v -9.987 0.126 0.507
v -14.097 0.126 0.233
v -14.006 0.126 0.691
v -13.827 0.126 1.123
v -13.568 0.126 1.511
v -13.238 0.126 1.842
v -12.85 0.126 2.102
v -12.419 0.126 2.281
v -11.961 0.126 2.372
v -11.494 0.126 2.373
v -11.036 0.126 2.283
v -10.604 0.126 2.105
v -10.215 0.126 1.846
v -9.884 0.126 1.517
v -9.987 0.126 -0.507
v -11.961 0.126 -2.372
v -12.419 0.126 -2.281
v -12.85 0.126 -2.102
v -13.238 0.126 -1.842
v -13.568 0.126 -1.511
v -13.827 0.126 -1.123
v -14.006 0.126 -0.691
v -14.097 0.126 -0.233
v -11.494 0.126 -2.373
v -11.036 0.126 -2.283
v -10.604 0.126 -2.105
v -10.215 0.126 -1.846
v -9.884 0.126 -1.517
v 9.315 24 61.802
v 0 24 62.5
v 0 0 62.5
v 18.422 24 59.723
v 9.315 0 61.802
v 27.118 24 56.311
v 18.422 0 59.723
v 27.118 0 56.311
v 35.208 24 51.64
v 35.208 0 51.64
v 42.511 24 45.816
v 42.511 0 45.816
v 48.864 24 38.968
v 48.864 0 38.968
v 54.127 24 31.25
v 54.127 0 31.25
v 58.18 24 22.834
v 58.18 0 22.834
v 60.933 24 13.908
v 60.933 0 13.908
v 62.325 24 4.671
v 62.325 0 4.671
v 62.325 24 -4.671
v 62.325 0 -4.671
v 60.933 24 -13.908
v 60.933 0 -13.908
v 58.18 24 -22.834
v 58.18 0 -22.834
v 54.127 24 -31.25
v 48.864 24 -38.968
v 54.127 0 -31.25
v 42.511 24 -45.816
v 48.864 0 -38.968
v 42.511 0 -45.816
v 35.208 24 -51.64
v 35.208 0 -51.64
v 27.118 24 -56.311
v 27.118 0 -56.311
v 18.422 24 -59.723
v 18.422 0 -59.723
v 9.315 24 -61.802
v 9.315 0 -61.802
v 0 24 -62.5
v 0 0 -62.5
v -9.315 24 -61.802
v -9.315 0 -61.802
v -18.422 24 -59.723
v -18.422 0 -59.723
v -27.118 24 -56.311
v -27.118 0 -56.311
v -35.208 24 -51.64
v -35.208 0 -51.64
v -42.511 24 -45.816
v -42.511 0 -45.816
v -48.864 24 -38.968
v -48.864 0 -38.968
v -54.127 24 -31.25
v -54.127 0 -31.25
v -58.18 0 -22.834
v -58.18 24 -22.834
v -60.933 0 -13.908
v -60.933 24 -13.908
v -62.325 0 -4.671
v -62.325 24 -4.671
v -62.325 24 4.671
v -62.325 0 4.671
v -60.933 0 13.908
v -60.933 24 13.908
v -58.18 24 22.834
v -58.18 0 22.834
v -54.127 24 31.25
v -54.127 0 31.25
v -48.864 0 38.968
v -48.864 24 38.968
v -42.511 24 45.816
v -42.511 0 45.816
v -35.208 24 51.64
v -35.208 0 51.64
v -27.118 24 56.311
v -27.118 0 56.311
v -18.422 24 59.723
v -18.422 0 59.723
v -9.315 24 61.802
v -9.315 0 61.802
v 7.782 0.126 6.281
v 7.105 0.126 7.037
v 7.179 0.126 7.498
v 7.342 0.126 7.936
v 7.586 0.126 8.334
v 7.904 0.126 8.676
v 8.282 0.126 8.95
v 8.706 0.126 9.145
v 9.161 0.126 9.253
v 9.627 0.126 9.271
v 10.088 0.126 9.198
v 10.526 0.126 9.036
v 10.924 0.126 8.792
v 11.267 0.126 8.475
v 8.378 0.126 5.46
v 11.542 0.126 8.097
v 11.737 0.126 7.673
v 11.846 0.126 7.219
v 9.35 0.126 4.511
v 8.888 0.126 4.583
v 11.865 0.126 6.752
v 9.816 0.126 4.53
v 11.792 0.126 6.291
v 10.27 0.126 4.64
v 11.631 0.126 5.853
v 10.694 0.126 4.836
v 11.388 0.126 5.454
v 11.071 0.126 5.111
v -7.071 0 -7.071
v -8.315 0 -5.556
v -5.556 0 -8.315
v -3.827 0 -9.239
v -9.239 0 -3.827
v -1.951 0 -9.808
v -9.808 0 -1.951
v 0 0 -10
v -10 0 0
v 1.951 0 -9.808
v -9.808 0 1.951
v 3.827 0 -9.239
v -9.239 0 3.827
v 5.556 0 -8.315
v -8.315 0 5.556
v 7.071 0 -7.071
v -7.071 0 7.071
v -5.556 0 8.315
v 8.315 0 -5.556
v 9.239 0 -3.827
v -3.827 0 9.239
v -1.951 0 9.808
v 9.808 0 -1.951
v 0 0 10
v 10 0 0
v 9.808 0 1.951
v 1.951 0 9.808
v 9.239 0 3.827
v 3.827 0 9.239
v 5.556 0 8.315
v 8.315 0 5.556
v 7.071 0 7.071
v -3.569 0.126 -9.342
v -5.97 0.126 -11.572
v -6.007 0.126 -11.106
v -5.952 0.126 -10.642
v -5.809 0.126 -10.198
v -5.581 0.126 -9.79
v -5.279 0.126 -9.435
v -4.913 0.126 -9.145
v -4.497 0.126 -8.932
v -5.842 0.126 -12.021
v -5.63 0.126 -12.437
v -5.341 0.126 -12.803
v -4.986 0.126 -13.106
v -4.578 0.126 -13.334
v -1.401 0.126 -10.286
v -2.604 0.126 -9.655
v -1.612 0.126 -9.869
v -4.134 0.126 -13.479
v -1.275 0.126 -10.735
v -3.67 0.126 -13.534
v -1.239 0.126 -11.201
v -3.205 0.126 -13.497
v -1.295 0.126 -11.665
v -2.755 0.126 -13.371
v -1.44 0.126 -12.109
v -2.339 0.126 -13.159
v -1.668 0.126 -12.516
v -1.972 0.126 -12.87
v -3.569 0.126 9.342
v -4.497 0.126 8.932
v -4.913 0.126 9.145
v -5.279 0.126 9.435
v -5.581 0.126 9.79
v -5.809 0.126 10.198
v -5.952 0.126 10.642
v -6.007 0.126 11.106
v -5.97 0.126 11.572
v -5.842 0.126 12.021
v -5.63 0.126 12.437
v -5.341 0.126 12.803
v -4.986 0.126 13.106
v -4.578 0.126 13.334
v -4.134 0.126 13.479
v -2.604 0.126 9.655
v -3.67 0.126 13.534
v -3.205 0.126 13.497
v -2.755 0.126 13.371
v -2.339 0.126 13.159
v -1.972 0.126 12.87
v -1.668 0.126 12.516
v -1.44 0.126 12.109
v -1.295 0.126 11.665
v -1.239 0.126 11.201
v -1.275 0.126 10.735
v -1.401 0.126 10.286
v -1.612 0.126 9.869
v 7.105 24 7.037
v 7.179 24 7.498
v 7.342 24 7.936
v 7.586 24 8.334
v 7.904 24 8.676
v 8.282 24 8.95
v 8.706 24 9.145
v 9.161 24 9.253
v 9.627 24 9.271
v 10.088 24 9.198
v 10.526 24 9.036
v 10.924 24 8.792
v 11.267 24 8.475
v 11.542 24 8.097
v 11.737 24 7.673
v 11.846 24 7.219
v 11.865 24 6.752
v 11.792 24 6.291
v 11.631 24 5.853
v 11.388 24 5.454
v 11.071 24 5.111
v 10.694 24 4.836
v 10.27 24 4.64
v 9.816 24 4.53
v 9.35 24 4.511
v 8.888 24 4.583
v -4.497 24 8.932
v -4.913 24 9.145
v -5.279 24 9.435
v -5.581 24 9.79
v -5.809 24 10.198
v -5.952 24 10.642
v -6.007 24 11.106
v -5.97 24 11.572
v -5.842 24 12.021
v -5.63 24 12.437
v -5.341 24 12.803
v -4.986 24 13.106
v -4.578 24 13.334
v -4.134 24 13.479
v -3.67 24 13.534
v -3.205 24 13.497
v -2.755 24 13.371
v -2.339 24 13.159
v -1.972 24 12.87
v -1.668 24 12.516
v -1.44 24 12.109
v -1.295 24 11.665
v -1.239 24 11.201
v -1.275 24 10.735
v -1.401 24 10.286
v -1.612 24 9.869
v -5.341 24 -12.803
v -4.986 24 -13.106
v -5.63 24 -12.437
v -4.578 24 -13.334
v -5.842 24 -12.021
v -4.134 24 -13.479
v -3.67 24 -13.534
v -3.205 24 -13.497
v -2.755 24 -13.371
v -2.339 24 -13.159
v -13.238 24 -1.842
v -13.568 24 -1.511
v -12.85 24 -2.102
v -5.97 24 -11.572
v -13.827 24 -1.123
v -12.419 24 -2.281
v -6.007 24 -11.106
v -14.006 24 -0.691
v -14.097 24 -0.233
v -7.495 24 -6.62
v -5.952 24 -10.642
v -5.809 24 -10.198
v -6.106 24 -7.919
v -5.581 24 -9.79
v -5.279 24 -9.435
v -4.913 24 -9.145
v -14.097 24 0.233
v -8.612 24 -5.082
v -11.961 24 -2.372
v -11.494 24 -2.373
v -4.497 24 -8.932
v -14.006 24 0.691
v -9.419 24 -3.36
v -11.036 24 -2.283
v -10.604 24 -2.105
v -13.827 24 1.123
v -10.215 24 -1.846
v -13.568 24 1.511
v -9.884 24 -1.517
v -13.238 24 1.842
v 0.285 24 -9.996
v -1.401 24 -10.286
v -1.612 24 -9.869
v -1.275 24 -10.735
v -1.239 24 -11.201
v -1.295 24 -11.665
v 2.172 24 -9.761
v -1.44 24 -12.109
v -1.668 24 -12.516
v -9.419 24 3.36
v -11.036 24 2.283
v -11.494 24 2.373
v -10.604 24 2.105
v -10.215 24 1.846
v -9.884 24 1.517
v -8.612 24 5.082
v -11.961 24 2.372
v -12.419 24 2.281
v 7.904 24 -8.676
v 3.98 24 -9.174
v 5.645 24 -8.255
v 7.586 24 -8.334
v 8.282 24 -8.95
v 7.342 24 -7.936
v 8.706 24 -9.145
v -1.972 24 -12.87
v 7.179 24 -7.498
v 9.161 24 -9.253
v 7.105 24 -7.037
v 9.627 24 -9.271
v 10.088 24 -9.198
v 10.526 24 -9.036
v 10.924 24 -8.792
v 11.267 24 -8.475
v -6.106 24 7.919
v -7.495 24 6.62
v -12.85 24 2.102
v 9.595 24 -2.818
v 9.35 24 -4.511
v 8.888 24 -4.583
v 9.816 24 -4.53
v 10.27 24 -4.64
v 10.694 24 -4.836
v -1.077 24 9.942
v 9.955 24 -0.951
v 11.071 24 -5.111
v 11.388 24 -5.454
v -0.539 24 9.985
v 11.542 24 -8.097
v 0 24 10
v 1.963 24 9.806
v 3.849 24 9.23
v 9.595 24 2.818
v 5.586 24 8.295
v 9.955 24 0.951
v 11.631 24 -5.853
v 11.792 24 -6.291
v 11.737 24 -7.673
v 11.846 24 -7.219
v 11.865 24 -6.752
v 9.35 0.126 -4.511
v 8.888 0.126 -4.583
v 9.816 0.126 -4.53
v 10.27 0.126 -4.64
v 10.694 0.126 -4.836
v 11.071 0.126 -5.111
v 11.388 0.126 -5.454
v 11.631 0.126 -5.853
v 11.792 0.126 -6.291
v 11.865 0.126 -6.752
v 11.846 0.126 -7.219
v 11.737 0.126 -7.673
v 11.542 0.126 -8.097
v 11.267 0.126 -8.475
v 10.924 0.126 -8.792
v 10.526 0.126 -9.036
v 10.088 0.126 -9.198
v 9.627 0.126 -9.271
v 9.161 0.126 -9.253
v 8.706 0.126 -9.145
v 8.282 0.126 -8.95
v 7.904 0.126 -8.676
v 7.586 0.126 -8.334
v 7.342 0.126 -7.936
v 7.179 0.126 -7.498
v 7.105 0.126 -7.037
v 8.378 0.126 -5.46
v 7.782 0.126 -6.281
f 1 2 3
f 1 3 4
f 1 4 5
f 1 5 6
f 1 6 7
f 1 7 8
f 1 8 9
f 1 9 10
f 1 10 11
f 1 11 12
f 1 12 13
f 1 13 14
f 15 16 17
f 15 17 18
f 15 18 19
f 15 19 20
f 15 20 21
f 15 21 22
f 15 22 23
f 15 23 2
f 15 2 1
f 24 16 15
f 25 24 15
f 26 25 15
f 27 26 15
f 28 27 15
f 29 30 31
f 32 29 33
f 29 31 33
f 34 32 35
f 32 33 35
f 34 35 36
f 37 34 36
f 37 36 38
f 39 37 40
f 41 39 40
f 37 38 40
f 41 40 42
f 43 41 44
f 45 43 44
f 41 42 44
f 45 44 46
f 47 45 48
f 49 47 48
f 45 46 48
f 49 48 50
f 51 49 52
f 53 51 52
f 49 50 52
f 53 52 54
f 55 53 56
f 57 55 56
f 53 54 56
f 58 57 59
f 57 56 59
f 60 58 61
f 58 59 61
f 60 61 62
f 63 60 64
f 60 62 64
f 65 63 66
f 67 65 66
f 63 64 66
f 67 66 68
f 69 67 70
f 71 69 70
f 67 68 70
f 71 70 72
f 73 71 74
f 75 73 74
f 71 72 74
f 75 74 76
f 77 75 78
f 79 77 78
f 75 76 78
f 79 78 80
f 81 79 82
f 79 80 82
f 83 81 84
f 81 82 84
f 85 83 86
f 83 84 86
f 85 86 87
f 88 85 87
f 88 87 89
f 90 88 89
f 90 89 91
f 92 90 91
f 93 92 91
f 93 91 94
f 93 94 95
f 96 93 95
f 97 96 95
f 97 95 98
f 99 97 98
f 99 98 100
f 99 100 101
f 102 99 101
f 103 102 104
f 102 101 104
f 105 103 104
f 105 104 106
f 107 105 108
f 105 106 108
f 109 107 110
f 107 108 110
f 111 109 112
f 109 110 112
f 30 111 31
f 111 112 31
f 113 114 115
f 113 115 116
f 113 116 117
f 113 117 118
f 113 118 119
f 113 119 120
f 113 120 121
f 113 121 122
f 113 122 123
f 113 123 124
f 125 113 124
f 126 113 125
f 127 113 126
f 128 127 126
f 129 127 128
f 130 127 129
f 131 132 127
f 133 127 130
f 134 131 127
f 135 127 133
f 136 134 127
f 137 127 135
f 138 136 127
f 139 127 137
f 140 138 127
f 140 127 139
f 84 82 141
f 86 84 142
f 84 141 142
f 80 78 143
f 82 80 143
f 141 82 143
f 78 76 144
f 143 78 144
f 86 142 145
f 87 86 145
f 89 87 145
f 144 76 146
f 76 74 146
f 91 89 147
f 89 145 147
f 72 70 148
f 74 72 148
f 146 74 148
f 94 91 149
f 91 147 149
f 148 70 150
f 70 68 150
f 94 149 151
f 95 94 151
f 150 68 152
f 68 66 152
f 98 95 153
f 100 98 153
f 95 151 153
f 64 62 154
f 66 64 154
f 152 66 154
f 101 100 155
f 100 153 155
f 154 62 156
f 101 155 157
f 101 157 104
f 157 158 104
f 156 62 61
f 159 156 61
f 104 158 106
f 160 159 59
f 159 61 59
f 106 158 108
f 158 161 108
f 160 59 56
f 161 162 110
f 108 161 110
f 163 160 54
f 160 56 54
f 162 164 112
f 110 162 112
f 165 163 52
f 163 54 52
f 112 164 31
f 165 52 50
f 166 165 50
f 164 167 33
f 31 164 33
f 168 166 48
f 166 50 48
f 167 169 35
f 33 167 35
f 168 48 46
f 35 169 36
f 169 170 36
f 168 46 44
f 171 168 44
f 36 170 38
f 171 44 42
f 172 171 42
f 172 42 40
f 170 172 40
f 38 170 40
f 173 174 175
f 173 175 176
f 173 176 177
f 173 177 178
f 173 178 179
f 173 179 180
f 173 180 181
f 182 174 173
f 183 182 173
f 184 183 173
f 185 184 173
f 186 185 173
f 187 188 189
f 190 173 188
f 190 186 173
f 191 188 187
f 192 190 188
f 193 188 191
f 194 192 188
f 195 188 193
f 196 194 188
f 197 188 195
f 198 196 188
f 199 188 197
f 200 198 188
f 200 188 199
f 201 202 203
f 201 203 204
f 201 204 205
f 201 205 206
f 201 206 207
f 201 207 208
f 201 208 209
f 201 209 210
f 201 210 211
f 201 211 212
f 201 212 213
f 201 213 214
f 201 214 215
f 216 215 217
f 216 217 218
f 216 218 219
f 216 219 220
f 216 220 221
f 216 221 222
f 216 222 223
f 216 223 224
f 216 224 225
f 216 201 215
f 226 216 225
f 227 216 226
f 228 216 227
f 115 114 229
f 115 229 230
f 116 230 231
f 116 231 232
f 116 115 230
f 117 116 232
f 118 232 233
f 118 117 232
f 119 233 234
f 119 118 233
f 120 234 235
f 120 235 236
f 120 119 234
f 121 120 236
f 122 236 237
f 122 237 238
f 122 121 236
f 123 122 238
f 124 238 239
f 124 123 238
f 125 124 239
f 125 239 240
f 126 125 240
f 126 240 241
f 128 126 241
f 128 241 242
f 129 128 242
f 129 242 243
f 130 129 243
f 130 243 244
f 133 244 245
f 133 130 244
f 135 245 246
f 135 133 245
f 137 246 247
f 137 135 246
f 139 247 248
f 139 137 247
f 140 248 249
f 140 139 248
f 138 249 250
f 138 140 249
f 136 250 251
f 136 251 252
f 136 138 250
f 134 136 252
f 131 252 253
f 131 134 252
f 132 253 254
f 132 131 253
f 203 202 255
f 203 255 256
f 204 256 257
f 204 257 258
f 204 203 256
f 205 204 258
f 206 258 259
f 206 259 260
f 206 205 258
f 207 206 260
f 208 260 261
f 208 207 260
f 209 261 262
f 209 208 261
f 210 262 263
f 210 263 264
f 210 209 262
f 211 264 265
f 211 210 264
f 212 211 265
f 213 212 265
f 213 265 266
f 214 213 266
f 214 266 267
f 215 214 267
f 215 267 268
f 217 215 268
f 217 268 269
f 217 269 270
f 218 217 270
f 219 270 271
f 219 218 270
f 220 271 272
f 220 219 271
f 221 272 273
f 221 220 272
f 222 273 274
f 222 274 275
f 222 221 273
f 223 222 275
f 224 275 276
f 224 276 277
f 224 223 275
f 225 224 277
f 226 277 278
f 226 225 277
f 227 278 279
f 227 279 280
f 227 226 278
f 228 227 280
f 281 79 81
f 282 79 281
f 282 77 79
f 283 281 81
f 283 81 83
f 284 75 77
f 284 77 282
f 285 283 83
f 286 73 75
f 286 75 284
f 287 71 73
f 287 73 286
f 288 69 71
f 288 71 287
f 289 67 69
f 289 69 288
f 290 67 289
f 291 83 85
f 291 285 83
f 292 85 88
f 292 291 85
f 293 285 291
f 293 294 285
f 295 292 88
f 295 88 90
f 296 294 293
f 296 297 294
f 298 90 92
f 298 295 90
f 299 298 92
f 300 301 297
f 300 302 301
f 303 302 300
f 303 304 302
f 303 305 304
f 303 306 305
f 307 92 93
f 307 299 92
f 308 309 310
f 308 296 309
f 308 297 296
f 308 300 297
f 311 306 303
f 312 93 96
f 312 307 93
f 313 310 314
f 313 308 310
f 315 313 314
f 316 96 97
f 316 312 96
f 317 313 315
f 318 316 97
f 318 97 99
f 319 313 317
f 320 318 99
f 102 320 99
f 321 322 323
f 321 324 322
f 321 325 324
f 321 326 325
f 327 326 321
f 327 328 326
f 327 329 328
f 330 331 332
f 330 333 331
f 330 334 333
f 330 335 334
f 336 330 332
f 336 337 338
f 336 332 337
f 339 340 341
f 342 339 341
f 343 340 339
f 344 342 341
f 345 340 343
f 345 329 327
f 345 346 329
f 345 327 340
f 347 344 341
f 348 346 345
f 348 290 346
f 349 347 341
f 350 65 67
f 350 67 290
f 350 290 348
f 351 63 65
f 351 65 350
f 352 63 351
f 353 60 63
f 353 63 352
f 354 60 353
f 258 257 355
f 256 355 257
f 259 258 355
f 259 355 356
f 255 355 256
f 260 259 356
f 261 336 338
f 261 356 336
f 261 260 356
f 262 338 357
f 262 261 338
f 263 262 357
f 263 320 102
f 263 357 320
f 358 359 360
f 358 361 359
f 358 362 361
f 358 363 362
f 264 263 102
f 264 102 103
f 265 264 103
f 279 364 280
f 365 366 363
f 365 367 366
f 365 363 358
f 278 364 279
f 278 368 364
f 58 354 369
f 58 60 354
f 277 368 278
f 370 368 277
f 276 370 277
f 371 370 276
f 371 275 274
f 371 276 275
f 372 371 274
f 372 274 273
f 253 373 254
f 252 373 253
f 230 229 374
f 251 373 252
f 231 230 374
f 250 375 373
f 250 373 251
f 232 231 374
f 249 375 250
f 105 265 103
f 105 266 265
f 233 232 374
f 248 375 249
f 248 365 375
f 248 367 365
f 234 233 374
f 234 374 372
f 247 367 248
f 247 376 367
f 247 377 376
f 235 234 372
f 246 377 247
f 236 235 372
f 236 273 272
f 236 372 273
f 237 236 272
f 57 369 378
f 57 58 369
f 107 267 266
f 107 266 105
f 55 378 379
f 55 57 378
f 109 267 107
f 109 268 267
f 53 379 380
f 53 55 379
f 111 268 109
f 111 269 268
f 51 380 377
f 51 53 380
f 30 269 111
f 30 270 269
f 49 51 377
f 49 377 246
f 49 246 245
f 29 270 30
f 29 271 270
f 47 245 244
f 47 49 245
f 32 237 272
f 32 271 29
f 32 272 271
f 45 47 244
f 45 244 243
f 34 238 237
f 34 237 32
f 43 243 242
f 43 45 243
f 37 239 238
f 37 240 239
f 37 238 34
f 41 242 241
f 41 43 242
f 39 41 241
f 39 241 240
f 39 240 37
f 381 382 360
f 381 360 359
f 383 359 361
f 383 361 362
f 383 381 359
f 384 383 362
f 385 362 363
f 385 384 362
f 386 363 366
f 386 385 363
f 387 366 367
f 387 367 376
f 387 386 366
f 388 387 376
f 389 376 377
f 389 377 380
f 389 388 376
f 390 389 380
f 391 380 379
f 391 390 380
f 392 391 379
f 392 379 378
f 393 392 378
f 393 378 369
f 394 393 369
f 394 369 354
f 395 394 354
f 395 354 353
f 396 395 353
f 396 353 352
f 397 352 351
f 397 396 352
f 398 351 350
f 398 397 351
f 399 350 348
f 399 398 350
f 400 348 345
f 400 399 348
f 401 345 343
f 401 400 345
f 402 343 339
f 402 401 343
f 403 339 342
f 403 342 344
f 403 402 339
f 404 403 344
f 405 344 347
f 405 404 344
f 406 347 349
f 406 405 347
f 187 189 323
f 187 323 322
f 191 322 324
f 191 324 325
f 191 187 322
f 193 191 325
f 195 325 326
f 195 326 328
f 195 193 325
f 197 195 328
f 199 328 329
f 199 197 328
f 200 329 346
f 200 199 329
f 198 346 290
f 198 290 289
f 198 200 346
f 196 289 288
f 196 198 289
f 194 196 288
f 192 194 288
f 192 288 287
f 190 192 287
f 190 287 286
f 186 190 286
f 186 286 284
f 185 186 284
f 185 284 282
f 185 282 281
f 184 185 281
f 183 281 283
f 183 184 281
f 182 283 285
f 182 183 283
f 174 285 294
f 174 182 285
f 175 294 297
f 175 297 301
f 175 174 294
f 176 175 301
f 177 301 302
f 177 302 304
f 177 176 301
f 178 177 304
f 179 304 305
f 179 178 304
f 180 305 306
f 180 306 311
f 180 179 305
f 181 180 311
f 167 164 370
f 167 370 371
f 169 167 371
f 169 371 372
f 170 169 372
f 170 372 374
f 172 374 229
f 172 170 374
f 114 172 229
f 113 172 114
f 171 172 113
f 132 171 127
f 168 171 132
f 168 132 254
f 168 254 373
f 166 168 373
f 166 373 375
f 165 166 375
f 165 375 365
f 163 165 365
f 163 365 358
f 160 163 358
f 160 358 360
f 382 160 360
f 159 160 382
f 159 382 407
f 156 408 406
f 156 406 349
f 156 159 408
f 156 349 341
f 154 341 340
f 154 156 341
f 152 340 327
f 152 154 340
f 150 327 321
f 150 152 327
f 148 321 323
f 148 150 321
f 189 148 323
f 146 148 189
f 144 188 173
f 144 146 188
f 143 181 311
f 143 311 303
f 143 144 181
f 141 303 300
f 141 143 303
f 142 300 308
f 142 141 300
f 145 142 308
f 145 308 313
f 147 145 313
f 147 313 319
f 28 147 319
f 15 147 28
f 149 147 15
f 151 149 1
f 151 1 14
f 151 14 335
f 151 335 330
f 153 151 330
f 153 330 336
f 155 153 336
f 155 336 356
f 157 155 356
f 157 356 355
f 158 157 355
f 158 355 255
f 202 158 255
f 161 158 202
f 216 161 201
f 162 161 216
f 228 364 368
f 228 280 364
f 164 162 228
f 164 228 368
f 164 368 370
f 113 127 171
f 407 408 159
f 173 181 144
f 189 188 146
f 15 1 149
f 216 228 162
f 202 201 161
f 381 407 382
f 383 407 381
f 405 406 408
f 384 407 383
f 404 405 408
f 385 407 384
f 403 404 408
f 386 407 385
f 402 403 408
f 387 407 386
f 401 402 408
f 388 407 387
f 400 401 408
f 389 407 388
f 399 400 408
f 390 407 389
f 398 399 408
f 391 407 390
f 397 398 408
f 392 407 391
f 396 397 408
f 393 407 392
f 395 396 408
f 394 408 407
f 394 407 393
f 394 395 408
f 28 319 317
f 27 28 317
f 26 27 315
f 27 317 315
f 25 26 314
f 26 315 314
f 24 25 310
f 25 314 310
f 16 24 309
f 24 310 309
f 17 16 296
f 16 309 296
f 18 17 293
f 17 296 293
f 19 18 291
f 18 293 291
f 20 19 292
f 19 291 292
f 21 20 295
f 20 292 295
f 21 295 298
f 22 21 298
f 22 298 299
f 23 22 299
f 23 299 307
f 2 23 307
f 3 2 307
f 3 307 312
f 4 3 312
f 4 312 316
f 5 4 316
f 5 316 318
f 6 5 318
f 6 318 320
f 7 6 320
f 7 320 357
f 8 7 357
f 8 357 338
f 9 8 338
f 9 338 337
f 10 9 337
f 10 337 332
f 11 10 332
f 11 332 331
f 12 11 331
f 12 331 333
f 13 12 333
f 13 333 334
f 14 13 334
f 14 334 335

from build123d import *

# Parameters (mm, degrees)
SKETCH1_R           = 62.5
BOSS_EXTRUDE1_DEPTH = 24
SKETCH2_R           = 10
CUT_EXTRUDE1_DEPTH  = 92.588754768
SKETCH3_R           = 2.384291232
CUT_EXTRUDE2_DEPTH  = 23.873555075
CIRPATTERN1_COUNT   = 5


with BuildPart() as part:
    # Sketch1 → Boss-Extrude1 (new body)
    with BuildSketch(Plane(origin=(0, 0, 0), x_dir=(1, 0, 0), z_dir=(0, 1, 0))):
        Circle(SKETCH1_R)
    extrude(amount=BOSS_EXTRUDE1_DEPTH)

    # Sketch2 → Cut-Extrude1 (cut, through all)
    with BuildSketch(Plane(origin=(0, 0, 0), x_dir=(1, 0, 0), z_dir=(0, 1, 0))):
        Circle(SKETCH2_R)
    extrude(amount=CUT_EXTRUDE1_DEPTH, mode=Mode.SUBTRACT)

    # Sketch3 → Cut-Extrude2 (cut)
    with BuildSketch(Plane(origin=(0, 24, 0), x_dir=(1, 0, 0), z_dir=(0, 1, 0))):
        with Locations((-11.723740212, 0)):
            Circle(SKETCH3_R)
    cut_extrude2 = extrude(amount=-CUT_EXTRUDE2_DEPTH, mode=Mode.SUBTRACT)

    # CirPattern1: Cut-Extrude2 ×5 about axis
    cirpattern1_axis = Axis((0, 0, 0), (0, 1, 0))
    for i in range(1, CIRPATTERN1_COUNT):
        add(cut_extrude2.rotate(cirpattern1_axis, i * 360 / CIRPATTERN1_COUNT), mode=Mode.SUBTRACT)


solid = part.part
